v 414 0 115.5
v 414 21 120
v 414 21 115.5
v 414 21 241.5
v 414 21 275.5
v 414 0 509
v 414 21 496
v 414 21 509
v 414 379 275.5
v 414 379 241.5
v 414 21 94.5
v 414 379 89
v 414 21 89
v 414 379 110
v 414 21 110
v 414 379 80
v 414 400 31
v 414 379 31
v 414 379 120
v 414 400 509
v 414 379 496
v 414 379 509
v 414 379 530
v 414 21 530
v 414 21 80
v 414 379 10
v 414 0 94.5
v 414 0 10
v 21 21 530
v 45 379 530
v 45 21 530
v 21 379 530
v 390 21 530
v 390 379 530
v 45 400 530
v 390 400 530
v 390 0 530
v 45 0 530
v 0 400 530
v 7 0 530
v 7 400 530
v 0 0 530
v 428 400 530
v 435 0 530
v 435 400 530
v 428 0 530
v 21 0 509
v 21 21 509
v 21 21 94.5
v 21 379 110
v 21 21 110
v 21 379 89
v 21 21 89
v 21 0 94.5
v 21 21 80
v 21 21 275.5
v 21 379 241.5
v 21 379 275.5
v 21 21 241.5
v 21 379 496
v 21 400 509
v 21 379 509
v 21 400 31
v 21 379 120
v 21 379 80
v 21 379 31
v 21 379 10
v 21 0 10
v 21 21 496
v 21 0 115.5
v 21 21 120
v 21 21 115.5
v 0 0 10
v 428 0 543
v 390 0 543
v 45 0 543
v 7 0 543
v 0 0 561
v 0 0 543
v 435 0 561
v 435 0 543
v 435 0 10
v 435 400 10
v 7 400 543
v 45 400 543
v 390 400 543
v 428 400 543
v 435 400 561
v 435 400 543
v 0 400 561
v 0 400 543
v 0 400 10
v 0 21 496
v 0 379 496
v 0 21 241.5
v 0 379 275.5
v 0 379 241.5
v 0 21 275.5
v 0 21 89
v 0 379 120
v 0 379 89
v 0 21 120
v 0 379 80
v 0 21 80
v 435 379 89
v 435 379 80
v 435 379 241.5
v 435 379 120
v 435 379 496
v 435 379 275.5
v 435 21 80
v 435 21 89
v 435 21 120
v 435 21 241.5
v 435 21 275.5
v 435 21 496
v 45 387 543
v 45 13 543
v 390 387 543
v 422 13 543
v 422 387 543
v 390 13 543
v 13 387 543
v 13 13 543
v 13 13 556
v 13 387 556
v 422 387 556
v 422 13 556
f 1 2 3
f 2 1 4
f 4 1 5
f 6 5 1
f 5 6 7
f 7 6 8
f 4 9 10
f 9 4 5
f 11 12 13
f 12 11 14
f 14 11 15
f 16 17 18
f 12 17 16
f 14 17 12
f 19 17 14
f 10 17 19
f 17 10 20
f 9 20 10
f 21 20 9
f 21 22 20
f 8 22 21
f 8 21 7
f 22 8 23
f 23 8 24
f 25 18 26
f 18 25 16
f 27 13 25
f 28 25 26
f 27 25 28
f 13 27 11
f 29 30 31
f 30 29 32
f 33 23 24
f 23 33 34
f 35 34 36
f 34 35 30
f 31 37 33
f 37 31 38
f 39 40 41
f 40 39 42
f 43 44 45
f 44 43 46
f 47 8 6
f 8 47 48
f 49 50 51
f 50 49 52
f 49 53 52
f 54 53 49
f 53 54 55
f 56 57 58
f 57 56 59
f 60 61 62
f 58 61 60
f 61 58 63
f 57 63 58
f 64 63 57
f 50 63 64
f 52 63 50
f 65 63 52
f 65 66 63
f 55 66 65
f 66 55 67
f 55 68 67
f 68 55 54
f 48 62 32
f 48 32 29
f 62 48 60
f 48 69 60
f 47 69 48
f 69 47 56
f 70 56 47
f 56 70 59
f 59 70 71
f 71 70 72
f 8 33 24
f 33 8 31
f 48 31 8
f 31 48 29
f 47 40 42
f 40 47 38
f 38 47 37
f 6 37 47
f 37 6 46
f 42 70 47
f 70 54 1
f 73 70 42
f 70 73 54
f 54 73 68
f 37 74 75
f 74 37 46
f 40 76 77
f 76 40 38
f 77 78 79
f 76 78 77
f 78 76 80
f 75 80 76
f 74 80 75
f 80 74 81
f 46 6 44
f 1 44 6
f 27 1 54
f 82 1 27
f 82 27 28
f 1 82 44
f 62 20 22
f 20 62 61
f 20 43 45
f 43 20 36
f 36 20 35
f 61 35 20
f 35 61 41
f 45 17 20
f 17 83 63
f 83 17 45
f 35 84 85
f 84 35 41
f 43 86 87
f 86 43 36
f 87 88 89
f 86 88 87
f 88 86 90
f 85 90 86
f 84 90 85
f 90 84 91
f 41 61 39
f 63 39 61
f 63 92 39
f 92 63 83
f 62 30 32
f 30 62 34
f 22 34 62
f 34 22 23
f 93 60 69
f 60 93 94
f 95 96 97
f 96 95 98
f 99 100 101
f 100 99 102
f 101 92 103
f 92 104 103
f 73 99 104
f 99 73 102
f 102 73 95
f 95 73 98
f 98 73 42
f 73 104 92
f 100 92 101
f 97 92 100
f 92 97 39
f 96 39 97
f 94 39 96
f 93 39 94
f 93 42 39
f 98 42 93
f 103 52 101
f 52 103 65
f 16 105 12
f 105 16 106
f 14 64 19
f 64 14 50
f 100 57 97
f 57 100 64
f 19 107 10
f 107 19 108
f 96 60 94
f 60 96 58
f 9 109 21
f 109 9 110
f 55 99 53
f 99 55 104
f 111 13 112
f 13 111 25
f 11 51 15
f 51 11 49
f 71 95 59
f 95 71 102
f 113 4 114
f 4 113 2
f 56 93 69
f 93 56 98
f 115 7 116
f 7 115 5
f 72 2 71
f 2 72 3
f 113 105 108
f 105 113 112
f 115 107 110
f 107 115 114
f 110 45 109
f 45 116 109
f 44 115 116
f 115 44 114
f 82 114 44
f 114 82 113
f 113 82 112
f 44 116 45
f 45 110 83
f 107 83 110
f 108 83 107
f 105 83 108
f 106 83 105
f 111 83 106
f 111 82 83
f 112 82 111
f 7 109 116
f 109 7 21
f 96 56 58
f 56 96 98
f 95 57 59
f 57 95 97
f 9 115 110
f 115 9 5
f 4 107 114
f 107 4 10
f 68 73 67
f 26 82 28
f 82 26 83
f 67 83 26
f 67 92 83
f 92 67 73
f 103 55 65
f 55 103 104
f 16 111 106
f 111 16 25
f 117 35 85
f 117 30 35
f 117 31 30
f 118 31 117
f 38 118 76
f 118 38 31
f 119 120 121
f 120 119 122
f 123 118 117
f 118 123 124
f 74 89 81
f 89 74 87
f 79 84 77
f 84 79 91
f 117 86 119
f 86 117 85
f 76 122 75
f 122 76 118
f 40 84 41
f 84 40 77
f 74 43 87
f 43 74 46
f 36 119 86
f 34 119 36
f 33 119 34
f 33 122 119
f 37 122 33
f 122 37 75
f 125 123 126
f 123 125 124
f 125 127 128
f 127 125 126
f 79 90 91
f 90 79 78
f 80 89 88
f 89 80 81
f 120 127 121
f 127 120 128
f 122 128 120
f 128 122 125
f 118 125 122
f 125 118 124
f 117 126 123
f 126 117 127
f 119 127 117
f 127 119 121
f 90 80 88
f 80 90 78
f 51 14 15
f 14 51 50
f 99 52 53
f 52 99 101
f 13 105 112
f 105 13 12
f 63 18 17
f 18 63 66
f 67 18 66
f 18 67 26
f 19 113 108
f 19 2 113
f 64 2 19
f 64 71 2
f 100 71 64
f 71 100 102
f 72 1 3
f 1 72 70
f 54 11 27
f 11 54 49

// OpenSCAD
//ecran 15" 4/3 = 229mm x 305mm
//plus cadre ~~ 260x335

//ecran 15" 16/9 = 187mm x 332mm
//plus cadre ~~ 210x360
//ok

l_e=379; // largeur ext écran mm
jeu= 7;//jeu de chaque coté mm

pp= 400; // profondeur caisse mm

t1=21; // largeur tasseau 1 (carre)
t1l=21;

t2=13;

p1l=38; //l planche1
p1h=13;//h planche1

p2h=21;//h planche1
p2l=34; //l planche1

t3=21;
t3l=70;

ll=l_e+2*jeu+2*t1; //largeur ext structure
echo("ll",ll);


ee=10; //epaisseur plateau milieu

ee_couv=5;

jj=400;
kk=120; // hteur dessous
hh=jj+kk; // hteur
hh2=hh+p1h+t1+ee+ee; //

echo("hh2",hh2);

ii=5; //e. placage

*color("grey") cube([ll,pp,ee]);


color("plum") {
    translate([0,0,hh-t1l+ee]){
        translate([t1,0,0])
        cube([ll-2*t1,t1,t1l]);
        translate([t1,pp-t1,0])
        cube([ll-2*t1,t1,t1l]);
    }}
color("magenta") {
    translate([0,0,hh-t1+ee]){
        translate([0,t1l,t1-p2l])
        cube([p2h,pp-2*t1l,p2l]);
        translate([ll-t1,t1l,t1-p2l])
        cube([p2h,pp-2*t1l,p2l]);
    }}

// pour les poignées si assez leger
color("magenta") {
    translate([0,0,(hh-t1+ee)/2]){
        translate([0,t1l,t1-p2l])
        cube([p2h,pp-2*t1l,p2l]);
        translate([ll-t1,t1l,t1-p2l])
        cube([p2h,pp-2*t1l,p2l]);
    }}

color("green") {
    translate([0,0,ee]){
        translate([0,0,0])
        cube([t1,t1l,hh]);
        translate([ll-t1,0,0])
        cube([t1,t1l,hh]);
        translate([0,pp-t1l,0])
        cube([t1,t1l,hh]);
        translate([ll-t1,pp-t1l,0])
        cube([t1,t1l,hh]);
    }}
color("magenta") {
    translate([0,0,ee]){
        translate([0,t1l,0])
        cube([t3,pp-2*t1l,t3l]);
        translate([ll-t1,t1l,0])
        cube([t3,pp-2*t1l,t3l]);
    }}
color("plum") {
    translate([0,0,ee]){
        translate([t1,pp-t1,0])
        cube([ll-2*t1,t1,t1l]);
    }}
// planches sur le cadre

color("orange"){
    translate([0,0,hh+ee]){
        translate([jeu,0,0])
        cube([p1l,pp,p1h]);
        translate([ll-p1l-jeu,0,0])
        cube([p1l,pp,p1h]);
    }}
// couvercle

color("yellow",0.6) {
    translate([0,0,hh+ee+p1h]){
        translate([0,0,0])
        cube([t2,pp,t2]);
        translate([ll-t2,0,0])
        cube([t2,pp,t2]);
        translate([t2,0,0])
        cube([ll-2*t2,t2,t2]);
        translate([t2,pp-t2,0])
        cube([ll-2*t2,t2,t2]);
        translate([0,0,t2])
        cube([ll,pp,ee_couv]);
    }}

//middle
color("plum") {
    translate([0,0,kk-t1l-ee]){
        translate([0,t1l,0])
        cube([t1,pp-2*t1l,t1l]);
        translate([ll-t1,t1l,0])
        cube([t1,pp-2*t1l,t1l]);
    }}
color("grey",0.7){
    translate([0,0,kk-p2l-ee]){
        union(){
    //    translate([t1,0,p2l])
    //    cube([ll-2*t1,pp,ee]);
            translate([0,t1,p2l])
            cube([ll,pp-2*t1,ee]);
    }}}
color("blue",0.8) {
    translate([0,0,kk-p2l-ee-ee]){
        translate([t1,0,p2l+ee/2-t1/2])
        cube([ll-2*t1,t1,t1]);
    }}

// placage
*color("tan",0.8){
    translate([-ii,0,0])
    cube([ii,pp,hh2]);
    translate([ll,0,0])
    cube([ii,pp,hh2]);
}
//arriere
*translate([-ii,pp,0])
color("pink") cube([ll+2*ii,ii,hh2]);

//tiroir
{
e_coulisse=10;
p_coulisse=350;
h_coulisse=10;
h_ss_plancher=10;
*color("red",0.8){
    translate([t1+e_coulisse,0,ee+h_coulisse])
    cube([ll-2*t1-2*e_coulisse,p_coulisse,kk-3*ee-h_coulisse-h_ss_plancher]);
    translate([-ii,-ii,0])
    cube([ll+2*ii,ii,kk-2*ee-h_ss_plancher]);
}
}

//devant
{
color("pink")
*union(){
    h_cache=60;
    translate([-ii,-ii,hh-h_cache])
    cube([ll+2*ii,ii,h_cache-hh+hh2]);
    //devant bas
    h_cache_b=20;
    translate([-ii,-ii,kk-2*ee-h_ss_plancher])
    cube([ll+2*ii,ii,h_cache_b-hh+hh2]);
    //
    cote=25;
    translate([-ii,-ii,kk-2*ee-h_ss_plancher+h_cache_b-hh+hh2])
    cube([cote+ii,ii,jj-h_cache+hh-hh2+ii]);
    translate([ll-cote,-ii,kk-2*ee-h_ss_plancher+h_cache_b-hh+hh2])
    cube([cote+ii,ii,jj-h_cache+hh-hh2+ii]);
    }
}
